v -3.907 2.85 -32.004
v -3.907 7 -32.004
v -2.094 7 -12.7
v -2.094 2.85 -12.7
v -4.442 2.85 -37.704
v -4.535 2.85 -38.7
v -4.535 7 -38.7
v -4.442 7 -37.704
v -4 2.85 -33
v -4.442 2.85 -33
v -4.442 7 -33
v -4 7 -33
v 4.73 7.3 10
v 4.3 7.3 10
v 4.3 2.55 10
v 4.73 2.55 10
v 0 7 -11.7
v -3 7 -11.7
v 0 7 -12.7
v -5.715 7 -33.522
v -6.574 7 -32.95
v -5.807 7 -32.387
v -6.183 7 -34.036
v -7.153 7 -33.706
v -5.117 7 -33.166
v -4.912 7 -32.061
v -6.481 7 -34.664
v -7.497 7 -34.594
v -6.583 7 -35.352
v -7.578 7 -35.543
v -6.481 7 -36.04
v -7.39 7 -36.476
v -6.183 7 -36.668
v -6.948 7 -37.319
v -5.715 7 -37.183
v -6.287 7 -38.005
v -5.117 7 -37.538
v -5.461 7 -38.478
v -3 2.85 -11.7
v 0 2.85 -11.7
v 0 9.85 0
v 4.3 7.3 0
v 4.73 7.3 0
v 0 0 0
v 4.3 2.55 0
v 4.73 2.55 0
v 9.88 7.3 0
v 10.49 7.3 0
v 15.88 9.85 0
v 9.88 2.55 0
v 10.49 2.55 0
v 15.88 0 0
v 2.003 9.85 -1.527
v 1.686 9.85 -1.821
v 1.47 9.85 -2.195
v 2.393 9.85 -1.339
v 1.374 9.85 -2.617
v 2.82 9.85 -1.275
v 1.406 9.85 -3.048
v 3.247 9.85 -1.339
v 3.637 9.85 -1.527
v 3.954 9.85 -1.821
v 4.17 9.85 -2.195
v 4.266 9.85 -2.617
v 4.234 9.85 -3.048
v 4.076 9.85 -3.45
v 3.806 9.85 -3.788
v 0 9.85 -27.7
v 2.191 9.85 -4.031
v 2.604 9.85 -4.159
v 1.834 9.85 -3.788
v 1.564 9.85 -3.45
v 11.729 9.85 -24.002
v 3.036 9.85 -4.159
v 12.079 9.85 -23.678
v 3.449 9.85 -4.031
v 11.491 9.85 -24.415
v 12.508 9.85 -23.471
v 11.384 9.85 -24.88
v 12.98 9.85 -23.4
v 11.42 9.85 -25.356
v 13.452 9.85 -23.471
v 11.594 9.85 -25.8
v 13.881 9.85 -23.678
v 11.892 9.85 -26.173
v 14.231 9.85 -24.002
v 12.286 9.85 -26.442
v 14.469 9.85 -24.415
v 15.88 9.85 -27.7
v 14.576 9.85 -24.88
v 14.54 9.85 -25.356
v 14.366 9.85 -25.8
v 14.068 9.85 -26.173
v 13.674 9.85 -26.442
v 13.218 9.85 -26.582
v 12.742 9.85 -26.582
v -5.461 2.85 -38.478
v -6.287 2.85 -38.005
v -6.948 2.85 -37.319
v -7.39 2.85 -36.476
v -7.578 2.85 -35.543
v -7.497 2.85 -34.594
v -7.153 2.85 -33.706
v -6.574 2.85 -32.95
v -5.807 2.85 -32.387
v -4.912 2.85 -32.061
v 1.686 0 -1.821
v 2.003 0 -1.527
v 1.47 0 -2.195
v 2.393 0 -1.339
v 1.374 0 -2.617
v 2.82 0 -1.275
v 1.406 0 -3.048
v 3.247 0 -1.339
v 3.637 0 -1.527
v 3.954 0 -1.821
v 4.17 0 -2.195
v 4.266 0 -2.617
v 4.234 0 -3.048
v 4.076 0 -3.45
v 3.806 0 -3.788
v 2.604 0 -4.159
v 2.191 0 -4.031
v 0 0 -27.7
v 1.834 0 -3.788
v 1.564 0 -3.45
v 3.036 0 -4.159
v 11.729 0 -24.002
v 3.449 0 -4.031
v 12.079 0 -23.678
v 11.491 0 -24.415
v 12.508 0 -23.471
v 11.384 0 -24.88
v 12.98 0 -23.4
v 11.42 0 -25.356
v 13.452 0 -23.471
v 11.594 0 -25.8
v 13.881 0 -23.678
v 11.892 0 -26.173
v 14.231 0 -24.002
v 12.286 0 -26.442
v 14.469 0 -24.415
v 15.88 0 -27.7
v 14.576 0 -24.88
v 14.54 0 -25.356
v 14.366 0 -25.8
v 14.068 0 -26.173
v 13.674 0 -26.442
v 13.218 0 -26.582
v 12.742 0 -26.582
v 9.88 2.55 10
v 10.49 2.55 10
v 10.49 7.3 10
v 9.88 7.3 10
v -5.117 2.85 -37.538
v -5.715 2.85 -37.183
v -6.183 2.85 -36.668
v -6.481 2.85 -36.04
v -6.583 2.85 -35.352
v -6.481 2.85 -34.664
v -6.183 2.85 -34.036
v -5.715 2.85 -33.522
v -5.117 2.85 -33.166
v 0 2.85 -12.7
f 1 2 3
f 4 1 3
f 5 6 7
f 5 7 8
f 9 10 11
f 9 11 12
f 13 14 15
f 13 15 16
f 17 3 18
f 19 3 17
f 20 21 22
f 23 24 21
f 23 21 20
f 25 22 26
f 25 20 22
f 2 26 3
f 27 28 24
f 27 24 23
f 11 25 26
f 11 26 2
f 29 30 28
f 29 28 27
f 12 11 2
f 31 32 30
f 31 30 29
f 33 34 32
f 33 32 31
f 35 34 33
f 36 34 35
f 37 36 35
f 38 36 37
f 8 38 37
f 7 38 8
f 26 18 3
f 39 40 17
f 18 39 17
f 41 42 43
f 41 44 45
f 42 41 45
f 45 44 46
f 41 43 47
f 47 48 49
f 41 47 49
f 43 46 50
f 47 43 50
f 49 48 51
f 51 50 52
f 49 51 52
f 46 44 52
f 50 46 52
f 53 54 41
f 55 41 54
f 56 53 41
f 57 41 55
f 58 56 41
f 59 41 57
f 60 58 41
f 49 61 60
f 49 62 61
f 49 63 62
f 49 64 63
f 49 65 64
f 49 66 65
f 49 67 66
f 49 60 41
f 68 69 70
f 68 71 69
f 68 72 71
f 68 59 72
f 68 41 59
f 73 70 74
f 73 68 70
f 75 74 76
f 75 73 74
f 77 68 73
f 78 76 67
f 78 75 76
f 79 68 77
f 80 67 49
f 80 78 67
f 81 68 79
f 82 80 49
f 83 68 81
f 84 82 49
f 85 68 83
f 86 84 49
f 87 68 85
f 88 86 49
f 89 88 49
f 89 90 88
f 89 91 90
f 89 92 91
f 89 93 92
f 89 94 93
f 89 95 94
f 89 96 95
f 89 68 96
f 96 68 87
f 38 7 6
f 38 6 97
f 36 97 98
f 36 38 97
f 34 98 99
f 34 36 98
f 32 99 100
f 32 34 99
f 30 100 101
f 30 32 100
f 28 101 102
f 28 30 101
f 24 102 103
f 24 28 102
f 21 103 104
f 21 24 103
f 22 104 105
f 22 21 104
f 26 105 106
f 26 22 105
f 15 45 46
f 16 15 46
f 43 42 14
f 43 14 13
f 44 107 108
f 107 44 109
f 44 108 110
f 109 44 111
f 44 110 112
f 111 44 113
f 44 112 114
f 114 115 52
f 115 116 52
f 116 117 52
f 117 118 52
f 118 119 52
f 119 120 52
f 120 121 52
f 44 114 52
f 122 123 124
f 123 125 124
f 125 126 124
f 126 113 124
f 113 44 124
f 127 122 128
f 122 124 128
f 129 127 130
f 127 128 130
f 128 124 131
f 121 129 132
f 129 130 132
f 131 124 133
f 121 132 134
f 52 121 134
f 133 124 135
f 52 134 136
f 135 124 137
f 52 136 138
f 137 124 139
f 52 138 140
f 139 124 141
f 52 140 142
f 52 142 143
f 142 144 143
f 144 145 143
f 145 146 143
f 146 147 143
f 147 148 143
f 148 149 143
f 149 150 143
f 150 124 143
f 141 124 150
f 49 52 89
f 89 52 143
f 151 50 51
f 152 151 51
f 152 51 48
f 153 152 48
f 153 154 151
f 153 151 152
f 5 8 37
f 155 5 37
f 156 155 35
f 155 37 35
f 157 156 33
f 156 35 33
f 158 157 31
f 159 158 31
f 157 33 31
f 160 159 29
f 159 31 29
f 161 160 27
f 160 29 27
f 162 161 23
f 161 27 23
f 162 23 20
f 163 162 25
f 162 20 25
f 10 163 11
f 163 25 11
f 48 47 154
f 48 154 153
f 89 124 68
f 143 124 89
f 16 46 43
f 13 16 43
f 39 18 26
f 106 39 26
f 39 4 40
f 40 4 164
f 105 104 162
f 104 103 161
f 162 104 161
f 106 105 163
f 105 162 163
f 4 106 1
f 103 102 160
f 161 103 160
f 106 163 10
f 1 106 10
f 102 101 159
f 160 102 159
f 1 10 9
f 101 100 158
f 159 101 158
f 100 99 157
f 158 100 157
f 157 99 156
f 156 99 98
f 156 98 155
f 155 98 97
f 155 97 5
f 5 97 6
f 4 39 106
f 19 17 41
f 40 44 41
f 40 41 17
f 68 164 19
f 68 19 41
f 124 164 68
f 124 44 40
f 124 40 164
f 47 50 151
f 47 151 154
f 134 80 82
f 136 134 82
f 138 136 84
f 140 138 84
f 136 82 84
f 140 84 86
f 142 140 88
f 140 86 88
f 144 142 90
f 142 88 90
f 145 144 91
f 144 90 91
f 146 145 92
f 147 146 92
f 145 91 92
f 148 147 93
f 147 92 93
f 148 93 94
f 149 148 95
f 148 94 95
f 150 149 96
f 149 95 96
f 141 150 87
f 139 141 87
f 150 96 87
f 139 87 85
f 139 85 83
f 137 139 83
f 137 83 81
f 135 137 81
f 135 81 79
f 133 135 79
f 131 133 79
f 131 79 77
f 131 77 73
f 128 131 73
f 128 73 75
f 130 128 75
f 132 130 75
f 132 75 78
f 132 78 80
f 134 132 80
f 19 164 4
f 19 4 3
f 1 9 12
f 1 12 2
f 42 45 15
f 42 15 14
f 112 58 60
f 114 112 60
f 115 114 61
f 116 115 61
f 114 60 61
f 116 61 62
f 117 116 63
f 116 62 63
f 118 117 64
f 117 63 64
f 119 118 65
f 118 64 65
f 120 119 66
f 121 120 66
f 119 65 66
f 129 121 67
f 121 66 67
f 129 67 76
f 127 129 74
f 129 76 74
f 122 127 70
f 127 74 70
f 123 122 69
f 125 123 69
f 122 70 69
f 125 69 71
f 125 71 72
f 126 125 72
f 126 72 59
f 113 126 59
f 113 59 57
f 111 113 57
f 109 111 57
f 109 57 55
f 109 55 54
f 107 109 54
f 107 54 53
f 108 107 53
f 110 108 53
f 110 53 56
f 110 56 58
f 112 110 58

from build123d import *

# Parameters (mm, degrees)
SKETCH1_W           = 15.88
SKETCH1_H           = 27.7
BOSS_EXTRUDE1_DEPTH = 9.85
SKETCH2_W           = 0.61
SKETCH2_H           = 4.75
SKETCH2_W_2         = 0.43
BOSS_EXTRUDE2_DEPTH = 10
SKETCH4_R           = 1.45
SKETCH4_R_2         = 1.6
CUT_EXTRUDE1_DEPTH  = 10
SKETCH5_W           = 1
SKETCH5_H           = 4.15
BOSS_EXTRUDE3_DEPTH = 3
SKETCH7_R           = 3.362536074
SKETCH7_R_2         = 2.362536074
BOSS_EXTRUDE5_DEPTH = 4.15
CUT_EXTRUDE2_DEPTH  = 43.42645861


with BuildPart() as part:
    # Sketch1 → Boss-Extrude1 (new body)
    with BuildSketch(Plane(origin=(0, 0, 0), x_dir=(1, 0, 0), z_dir=(0, 1, 0))):
        with Locations((7.94, 13.85)):
            Rectangle(SKETCH1_W, SKETCH1_H)
    extrude(amount=BOSS_EXTRUDE1_DEPTH)

    # Sketch2 → Boss-Extrude2 (add)
    with BuildSketch(Plane.XY):
        with Locations((10.185, 4.925)):
            Rectangle(SKETCH2_W, SKETCH2_H)
        with Locations((4.515, 4.925)):
            Rectangle(SKETCH2_W_2, SKETCH2_H)
    extrude(amount=BOSS_EXTRUDE2_DEPTH)

    # Sketch4 → Cut-Extrude1 (cut)
    with BuildSketch(Plane(origin=(0, 9.85, 0), x_dir=(1, 0, 0), z_dir=(0, 1, 0))):
        with Locations(Location((2.82, 2.725, 0), (0, 0, 270))):
            Circle(SKETCH4_R)
        with Locations(Location((12.98, 25, 0), (0, 0, 270))):
            Circle(SKETCH4_R_2)
    extrude(amount=-CUT_EXTRUDE1_DEPTH, mode=Mode.SUBTRACT)

    # Sketch5 → Boss-Extrude3 (add)
    with BuildSketch(Plane.ZY):
        with Locations((-12.2, 4.925)):
            Rectangle(SKETCH5_W, SKETCH5_H)
    extrude(amount=BOSS_EXTRUDE3_DEPTH)

    # Sketch7 → Boss-Extrude5 (add)
    # profile 1 of 2: a face of its own
    with BuildSketch(Plane(origin=(0, 7, 0), x_dir=(1, 0, 0), z_dir=(0, 1, 0))):
        with Locations((-4.220862881, 35.35218968)):
            Circle(SKETCH7_R)
        with Locations((-4.220862881, 35.35218968)):
            Circle(SKETCH7_R_2, mode=Mode.SUBTRACT)
    # profile 2 of 2: a face of its own
    with BuildSketch(Plane(origin=(0, 7, 0), x_dir=(1, 0, 0), z_dir=(0, 1, 0))):
        Polygon((-3, 11.7), (-5, 33), (-4, 33), (-2, 11.7), align=None)
    extrude(amount=-BOSS_EXTRUDE5_DEPTH)

    # Sketch8 → Cut-Extrude2 (cut, through all)
    with BuildSketch(Plane(origin=(0, 2.85, 0), x_dir=(-1, 0, 0), z_dir=(0, -1, 0))):
        Polygon((3.906514494, 32.004379359), (-0.89687697, 32.455402032), (-0.268180196, 39.151022673), (4.535211268, 38.7), align=None)
    extrude(amount=-CUT_EXTRUDE2_DEPTH, mode=Mode.SUBTRACT)


solid = part.part
